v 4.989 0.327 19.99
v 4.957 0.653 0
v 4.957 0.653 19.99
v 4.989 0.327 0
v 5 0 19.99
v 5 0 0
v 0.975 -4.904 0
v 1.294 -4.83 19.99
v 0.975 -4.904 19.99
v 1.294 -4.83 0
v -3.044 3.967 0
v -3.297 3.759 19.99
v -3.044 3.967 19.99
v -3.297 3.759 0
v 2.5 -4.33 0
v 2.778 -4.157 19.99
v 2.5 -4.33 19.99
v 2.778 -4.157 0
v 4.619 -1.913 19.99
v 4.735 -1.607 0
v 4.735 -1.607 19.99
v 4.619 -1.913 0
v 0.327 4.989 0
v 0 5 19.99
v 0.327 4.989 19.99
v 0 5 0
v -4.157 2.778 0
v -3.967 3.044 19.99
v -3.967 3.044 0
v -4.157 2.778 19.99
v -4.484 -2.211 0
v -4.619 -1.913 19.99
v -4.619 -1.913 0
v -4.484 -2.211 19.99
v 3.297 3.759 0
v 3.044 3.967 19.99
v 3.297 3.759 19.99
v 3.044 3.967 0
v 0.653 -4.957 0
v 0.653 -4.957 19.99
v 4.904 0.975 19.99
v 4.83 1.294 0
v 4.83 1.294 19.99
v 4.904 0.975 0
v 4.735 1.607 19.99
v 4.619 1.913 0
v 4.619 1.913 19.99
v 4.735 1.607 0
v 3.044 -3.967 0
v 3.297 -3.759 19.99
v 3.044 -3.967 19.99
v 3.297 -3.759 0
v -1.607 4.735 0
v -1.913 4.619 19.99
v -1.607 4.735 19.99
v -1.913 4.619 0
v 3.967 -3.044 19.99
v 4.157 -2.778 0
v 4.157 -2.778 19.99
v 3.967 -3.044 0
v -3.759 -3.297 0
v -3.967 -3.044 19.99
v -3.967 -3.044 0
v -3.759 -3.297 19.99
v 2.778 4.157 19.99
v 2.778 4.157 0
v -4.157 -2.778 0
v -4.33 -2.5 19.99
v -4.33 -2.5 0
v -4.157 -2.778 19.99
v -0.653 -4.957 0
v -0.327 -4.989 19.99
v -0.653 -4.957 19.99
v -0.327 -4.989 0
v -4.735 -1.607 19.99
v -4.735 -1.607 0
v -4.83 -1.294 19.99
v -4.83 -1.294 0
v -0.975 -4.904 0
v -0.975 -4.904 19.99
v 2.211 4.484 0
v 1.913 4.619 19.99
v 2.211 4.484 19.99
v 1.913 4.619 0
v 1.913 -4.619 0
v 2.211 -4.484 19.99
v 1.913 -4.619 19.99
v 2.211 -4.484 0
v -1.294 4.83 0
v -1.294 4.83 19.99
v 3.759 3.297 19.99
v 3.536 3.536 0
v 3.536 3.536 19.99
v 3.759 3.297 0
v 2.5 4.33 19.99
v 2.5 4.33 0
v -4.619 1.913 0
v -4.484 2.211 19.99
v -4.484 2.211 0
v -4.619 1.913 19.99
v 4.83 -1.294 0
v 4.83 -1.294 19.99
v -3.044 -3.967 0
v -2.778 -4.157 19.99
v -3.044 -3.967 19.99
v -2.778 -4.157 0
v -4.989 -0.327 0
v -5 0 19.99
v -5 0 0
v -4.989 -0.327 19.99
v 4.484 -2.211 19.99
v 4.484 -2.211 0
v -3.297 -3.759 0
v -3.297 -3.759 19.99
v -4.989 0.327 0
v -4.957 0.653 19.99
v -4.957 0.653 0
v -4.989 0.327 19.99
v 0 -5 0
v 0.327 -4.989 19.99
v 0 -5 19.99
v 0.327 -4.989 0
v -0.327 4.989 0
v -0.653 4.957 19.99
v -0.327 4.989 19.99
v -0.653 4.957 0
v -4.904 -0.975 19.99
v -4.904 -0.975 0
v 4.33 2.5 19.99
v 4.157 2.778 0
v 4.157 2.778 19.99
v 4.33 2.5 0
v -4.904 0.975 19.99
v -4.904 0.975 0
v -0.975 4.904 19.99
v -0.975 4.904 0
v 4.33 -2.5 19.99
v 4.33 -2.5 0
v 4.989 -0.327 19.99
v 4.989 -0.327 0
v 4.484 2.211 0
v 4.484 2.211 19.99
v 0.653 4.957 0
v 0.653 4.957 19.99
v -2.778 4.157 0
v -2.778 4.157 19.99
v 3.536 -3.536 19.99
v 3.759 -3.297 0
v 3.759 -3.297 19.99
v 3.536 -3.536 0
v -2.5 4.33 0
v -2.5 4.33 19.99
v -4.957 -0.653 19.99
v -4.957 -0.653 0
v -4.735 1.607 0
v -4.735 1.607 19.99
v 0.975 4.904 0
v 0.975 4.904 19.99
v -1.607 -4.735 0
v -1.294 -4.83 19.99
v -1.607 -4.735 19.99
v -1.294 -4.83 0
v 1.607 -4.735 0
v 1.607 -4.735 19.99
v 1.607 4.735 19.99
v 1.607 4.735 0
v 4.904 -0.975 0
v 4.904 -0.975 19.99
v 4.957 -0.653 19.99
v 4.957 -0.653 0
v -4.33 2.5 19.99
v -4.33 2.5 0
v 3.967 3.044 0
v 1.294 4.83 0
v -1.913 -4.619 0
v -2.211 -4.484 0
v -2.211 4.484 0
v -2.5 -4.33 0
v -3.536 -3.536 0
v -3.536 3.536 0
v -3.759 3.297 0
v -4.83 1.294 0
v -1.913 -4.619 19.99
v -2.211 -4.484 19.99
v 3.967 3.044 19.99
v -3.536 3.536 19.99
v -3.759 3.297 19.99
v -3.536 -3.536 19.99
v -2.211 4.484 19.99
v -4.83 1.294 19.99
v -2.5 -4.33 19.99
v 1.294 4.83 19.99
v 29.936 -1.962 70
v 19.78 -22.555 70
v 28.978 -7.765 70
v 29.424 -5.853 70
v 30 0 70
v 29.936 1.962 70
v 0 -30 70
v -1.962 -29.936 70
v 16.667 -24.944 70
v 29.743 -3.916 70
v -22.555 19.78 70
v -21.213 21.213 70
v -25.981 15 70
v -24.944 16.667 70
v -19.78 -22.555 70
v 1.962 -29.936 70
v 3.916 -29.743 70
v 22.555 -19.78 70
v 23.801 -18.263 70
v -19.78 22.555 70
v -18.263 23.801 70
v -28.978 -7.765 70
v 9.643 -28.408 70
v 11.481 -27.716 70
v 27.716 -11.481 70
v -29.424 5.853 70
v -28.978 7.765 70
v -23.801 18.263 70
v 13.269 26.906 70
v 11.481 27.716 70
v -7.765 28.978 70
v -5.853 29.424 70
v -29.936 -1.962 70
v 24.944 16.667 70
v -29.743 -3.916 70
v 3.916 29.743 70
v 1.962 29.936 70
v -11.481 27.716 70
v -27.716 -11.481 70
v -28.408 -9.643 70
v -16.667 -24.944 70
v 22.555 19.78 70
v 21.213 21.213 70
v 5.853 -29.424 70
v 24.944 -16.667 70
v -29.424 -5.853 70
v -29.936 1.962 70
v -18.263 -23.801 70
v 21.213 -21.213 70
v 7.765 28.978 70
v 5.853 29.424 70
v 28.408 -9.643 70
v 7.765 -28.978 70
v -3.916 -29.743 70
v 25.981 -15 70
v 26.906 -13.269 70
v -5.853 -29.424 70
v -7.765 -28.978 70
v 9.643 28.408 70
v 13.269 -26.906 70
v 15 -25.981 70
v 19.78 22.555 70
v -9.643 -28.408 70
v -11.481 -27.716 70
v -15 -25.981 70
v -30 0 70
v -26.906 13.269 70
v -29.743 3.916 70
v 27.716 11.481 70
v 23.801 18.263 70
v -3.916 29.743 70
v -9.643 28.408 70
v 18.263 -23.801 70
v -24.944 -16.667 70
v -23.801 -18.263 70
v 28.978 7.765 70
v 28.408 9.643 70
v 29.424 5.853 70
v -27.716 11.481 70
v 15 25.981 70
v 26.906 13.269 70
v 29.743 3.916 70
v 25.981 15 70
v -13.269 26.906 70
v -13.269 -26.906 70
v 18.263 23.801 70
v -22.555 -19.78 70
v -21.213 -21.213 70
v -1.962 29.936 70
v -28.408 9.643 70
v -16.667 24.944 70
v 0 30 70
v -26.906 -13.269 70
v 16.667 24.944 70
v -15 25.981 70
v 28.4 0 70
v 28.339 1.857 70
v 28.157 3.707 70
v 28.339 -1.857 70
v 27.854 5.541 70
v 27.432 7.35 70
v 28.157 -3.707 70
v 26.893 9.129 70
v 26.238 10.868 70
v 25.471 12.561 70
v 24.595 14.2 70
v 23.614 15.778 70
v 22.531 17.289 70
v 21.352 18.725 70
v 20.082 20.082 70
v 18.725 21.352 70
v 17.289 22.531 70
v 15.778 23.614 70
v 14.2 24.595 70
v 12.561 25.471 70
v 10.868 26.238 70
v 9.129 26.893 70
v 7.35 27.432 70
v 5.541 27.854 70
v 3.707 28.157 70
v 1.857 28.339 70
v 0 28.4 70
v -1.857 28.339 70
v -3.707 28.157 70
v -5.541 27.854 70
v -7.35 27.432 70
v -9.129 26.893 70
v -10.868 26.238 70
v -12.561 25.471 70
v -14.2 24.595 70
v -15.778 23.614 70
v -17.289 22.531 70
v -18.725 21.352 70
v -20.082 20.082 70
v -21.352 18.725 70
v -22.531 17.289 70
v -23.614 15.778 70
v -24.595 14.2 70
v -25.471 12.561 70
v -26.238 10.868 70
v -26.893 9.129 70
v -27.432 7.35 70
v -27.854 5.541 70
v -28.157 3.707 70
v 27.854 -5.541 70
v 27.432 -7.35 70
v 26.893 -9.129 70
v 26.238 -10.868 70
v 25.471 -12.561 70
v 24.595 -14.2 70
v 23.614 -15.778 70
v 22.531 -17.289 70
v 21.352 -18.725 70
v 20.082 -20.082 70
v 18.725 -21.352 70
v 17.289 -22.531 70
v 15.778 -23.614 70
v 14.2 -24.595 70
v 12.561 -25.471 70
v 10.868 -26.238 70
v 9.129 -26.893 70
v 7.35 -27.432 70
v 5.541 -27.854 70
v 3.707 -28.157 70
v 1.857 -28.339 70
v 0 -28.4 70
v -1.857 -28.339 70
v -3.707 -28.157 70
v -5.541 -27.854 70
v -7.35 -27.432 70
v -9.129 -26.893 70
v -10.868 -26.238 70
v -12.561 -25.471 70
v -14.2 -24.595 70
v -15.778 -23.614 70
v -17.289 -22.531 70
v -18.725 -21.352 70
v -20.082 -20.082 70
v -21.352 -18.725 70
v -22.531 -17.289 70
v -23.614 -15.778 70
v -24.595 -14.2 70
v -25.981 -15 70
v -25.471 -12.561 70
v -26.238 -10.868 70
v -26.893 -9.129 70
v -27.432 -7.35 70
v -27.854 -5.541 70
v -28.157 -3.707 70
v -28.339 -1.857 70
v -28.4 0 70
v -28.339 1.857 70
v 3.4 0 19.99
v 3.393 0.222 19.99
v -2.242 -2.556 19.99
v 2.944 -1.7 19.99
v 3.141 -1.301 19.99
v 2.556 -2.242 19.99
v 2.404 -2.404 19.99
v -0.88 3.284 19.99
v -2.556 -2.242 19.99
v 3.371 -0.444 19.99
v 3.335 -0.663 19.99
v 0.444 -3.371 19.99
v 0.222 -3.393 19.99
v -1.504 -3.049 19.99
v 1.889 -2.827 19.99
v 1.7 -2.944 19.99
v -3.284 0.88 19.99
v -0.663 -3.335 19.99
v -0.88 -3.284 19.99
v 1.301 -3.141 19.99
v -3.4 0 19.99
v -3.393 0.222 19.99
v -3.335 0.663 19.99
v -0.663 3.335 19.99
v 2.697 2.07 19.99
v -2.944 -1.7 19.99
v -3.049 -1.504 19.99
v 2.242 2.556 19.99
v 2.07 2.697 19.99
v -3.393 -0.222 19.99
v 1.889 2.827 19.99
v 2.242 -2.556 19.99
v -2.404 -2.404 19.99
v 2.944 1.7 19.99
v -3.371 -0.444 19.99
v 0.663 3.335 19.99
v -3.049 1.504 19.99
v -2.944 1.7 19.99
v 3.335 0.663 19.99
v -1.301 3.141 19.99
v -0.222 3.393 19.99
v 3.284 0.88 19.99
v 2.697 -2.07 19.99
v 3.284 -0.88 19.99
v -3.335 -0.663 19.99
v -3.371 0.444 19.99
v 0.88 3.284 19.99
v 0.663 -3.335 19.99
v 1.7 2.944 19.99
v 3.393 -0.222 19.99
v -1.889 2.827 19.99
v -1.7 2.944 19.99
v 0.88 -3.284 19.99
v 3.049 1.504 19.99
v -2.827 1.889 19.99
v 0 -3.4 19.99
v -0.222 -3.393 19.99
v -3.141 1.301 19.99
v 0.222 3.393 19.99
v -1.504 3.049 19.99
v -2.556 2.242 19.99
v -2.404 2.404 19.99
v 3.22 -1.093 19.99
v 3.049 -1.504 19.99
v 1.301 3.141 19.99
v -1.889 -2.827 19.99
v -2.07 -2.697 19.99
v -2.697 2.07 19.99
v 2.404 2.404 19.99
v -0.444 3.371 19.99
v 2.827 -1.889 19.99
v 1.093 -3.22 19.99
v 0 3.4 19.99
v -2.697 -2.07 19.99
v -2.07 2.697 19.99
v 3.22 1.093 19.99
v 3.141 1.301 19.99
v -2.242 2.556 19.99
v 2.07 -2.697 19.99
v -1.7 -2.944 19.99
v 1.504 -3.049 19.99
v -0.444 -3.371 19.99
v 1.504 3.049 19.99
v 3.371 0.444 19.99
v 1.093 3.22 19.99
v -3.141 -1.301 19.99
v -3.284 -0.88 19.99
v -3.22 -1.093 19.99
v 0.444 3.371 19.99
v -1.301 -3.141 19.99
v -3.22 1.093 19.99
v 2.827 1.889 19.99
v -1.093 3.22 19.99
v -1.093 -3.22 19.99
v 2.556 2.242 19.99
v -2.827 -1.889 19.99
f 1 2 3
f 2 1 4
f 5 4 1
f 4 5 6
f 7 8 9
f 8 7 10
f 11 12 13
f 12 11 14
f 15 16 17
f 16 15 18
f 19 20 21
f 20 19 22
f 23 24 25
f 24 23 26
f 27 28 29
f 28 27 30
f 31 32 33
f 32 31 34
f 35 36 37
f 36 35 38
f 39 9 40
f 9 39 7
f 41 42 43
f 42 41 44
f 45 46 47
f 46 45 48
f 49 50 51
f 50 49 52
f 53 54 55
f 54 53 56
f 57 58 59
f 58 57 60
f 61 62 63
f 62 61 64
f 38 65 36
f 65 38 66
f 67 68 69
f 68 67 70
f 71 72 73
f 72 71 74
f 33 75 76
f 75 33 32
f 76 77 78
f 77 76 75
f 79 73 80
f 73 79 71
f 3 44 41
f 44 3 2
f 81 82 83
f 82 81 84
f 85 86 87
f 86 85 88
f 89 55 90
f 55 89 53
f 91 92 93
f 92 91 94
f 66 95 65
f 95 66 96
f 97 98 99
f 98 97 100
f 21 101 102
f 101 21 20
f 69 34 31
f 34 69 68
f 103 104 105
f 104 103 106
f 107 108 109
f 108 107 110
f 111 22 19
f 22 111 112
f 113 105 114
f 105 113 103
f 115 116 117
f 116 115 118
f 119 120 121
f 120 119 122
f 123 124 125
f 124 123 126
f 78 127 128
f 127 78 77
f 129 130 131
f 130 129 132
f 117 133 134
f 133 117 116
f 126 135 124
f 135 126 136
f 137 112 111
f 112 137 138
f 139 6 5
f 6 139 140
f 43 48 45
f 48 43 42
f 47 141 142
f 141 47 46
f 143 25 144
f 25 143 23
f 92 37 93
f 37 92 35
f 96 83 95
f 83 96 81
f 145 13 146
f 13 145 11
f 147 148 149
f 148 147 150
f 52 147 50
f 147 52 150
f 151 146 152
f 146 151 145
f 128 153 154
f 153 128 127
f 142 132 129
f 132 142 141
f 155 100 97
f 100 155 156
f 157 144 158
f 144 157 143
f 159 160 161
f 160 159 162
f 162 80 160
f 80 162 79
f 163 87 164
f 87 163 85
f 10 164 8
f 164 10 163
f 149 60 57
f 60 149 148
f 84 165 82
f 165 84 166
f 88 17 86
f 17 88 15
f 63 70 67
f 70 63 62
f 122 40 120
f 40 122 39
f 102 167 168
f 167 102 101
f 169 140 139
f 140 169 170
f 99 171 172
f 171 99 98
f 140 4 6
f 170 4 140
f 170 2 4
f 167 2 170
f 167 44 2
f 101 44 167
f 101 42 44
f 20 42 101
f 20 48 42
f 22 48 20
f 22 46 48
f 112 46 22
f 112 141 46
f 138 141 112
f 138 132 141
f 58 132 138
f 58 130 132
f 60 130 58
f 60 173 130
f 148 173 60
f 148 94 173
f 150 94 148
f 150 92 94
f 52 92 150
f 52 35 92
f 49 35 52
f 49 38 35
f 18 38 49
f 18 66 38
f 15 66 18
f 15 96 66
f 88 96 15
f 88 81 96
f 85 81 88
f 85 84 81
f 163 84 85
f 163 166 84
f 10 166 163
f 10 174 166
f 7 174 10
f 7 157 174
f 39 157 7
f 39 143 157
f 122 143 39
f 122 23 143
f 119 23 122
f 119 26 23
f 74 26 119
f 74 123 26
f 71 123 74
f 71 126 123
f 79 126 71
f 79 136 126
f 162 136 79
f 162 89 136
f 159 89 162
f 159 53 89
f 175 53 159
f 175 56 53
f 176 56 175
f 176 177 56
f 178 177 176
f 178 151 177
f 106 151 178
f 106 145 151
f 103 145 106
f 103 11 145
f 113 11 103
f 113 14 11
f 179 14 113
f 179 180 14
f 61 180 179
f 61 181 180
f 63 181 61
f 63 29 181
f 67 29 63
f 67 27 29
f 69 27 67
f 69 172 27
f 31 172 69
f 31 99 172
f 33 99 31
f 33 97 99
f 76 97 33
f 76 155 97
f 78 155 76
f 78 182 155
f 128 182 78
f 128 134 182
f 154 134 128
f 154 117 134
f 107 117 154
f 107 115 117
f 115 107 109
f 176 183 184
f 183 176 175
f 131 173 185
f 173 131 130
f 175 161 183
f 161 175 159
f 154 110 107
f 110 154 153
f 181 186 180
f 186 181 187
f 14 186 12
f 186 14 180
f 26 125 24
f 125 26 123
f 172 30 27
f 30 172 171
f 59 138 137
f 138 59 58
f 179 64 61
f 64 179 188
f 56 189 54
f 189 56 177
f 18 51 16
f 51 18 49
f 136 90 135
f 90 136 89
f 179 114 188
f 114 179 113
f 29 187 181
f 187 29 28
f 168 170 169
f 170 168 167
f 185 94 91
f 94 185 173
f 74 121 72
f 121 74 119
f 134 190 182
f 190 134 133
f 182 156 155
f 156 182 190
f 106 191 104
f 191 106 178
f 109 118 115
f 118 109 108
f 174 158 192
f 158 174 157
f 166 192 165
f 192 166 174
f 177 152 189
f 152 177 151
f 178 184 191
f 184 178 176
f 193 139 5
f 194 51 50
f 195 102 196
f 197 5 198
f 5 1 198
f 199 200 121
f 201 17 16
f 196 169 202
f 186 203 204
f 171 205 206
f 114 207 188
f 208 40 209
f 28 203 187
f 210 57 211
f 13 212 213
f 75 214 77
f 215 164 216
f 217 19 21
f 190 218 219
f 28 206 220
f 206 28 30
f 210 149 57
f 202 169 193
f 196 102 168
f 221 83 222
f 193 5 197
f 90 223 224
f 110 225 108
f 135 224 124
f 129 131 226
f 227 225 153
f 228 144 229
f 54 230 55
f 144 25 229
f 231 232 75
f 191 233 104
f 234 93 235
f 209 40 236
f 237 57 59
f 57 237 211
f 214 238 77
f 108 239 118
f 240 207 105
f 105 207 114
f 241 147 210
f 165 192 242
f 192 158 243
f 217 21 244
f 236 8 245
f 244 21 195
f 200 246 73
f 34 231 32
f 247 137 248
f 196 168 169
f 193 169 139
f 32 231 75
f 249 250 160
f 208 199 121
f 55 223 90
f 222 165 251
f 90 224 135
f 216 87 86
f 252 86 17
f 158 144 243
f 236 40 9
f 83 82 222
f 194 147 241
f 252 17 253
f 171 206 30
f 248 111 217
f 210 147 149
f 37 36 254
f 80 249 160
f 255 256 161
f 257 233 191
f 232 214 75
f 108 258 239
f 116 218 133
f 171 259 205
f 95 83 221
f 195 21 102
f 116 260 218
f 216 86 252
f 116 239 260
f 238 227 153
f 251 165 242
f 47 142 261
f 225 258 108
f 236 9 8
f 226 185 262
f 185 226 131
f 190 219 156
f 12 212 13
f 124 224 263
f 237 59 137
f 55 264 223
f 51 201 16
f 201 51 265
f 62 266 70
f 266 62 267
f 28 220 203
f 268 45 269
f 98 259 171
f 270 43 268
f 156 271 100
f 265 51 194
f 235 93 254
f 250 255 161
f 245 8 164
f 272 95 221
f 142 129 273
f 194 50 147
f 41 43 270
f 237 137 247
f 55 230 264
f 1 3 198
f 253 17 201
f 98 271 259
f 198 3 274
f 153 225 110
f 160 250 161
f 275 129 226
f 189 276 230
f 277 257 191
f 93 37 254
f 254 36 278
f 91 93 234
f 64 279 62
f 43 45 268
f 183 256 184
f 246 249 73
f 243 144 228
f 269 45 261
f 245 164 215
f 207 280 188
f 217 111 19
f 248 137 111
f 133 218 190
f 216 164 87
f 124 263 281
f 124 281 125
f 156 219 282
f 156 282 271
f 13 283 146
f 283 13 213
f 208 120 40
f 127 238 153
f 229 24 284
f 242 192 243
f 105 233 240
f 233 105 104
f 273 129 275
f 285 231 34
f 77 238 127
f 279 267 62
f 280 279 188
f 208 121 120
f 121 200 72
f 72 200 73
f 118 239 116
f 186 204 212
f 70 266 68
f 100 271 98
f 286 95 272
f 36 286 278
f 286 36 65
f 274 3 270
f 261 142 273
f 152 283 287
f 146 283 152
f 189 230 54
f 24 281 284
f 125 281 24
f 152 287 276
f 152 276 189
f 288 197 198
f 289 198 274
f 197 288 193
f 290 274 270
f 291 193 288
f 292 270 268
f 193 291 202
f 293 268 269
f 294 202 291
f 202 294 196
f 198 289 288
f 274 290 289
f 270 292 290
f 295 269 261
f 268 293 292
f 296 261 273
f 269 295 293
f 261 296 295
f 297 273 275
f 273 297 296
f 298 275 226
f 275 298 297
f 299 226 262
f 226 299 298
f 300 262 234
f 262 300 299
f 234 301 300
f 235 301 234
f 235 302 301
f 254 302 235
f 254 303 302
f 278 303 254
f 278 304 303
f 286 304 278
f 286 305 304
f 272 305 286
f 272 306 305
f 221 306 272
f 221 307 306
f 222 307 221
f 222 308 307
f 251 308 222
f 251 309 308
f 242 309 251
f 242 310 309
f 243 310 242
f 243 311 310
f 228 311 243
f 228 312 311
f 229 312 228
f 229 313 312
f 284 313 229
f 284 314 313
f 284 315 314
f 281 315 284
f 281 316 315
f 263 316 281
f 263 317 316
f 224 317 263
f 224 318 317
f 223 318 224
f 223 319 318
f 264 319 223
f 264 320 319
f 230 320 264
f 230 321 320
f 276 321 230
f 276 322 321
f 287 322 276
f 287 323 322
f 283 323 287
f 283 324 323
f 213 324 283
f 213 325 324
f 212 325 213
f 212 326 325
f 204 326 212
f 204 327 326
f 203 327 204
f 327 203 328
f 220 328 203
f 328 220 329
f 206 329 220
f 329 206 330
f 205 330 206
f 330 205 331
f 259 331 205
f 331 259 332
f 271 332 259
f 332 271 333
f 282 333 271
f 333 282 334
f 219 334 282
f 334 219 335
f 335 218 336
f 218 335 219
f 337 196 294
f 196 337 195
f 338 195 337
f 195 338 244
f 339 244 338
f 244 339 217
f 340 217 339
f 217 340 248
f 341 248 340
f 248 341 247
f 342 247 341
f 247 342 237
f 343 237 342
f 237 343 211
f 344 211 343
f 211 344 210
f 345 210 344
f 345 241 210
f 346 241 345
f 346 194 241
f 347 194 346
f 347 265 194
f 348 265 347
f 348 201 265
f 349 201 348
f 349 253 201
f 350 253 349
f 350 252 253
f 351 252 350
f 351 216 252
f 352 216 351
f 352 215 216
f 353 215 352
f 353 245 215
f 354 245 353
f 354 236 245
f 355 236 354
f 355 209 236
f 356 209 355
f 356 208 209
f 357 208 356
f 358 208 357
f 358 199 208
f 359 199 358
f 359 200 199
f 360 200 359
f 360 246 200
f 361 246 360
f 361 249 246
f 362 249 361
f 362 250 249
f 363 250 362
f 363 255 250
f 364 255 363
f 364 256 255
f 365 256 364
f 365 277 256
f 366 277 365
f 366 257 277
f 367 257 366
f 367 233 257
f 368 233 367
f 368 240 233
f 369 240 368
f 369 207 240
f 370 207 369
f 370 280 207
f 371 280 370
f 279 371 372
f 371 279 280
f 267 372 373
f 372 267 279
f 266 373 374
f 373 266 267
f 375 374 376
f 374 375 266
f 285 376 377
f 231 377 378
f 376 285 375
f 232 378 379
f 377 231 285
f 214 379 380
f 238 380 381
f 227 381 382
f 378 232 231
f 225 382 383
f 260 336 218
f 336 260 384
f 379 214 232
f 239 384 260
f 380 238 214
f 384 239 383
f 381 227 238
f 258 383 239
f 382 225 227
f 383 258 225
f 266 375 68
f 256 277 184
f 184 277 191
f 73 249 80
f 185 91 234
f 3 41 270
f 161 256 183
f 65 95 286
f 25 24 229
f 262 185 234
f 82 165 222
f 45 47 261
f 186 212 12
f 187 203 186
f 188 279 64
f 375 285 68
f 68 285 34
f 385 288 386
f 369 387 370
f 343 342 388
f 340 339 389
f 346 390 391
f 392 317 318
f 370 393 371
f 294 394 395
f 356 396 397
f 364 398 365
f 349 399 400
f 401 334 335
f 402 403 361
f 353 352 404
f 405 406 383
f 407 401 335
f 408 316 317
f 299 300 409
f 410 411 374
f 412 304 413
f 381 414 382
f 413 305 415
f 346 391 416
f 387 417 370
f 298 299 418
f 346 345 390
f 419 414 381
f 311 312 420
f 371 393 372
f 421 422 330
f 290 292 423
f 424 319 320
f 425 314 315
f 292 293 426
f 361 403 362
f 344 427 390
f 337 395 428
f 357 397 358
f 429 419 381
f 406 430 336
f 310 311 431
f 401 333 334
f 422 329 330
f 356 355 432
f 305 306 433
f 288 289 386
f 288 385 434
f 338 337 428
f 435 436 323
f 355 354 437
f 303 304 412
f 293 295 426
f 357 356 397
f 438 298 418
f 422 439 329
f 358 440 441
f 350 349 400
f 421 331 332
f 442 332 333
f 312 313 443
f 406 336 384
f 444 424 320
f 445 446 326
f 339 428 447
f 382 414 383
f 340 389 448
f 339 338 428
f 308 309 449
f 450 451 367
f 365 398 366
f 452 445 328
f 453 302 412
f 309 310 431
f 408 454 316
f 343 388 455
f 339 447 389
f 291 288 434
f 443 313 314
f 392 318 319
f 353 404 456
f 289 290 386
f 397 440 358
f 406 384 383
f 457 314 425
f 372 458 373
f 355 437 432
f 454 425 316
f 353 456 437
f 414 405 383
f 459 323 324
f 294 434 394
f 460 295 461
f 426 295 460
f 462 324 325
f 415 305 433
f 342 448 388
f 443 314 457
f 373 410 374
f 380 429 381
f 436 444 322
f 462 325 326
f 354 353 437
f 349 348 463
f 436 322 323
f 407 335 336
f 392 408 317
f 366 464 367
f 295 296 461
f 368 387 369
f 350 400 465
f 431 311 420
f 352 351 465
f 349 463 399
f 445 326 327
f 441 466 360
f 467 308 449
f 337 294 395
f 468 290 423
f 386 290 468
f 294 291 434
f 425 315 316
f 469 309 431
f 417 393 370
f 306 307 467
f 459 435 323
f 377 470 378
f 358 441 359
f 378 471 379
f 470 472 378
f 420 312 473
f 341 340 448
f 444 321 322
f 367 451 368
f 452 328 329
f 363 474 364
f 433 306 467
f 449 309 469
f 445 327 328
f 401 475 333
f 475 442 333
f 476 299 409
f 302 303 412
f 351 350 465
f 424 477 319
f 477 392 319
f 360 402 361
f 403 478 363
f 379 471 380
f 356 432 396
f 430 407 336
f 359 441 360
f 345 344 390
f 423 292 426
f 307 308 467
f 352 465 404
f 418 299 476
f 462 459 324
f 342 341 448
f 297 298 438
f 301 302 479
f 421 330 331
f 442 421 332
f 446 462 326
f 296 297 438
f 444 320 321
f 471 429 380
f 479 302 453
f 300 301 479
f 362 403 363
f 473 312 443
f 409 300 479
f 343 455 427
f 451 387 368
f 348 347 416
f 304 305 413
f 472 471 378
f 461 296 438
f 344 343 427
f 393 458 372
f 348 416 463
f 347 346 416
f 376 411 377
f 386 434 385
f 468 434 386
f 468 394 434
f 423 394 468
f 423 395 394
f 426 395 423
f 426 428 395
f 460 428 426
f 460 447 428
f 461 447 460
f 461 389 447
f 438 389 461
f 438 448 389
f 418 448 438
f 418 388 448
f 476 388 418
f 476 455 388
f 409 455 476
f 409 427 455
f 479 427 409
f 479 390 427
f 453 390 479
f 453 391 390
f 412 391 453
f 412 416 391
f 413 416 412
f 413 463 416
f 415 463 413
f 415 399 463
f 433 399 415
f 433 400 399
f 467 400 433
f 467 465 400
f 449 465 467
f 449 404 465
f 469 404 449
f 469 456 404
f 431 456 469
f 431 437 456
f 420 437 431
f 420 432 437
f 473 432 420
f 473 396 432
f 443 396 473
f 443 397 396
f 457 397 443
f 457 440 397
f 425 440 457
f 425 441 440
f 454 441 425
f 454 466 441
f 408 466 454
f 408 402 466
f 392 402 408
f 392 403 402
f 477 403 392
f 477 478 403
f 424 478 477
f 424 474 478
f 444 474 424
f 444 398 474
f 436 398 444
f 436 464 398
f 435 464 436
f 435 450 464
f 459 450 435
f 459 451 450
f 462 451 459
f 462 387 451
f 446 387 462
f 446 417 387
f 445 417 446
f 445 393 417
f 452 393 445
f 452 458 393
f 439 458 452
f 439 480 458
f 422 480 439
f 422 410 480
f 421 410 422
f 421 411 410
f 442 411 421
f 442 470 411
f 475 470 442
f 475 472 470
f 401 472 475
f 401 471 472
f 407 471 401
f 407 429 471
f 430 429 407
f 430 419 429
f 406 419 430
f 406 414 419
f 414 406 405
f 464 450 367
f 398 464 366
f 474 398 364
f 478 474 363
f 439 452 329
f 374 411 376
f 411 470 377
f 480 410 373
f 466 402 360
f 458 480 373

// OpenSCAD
// Small lab funnel - printed upright, open at top and bottom
// Units: mm

// ---- Parameters ----
spout_od      = 10;    // spout outer diameter
spout_id      = spout_od - 2 * 1.6;  // spout bore (6.8)
spout_h       = 20;    // spout height (z = 0 to 20)
cone_top_d    = 10;    // cone diameter where it meets the spout (z = 20)
cone_rim_d    = 60;    // cone rim diameter (z = 50)
cone_h        = cone_rim_d - cone_top_d;  // cone height (30)
wall          = 1.6;   // wall thickness everywhere
eps           = 0.5;   // cutter overshoot past faces

$fn = 96;

// ---- Model ----
difference() {
    union() {
        // Spout (tube)
        cylinder(d = spout_od, h = spout_h);
        // Cone - extended slightly below spout_top so the union fuses cleanly
        translate([0, 0, spout_h - 0.01])
            cylinder(d1 = cone_top_d, d2 = cone_rim_d, h = cone_h + 0.01);
    }
    // Through-bore: spout bore up to cone start, then cone wall thickness to rim
    translate([0, 0, spout_h - 0.01])
        cylinder(d1 = spout_id, d2 = cone_rim_d - 2 * wall, h = cone_h + 0.01);
}
